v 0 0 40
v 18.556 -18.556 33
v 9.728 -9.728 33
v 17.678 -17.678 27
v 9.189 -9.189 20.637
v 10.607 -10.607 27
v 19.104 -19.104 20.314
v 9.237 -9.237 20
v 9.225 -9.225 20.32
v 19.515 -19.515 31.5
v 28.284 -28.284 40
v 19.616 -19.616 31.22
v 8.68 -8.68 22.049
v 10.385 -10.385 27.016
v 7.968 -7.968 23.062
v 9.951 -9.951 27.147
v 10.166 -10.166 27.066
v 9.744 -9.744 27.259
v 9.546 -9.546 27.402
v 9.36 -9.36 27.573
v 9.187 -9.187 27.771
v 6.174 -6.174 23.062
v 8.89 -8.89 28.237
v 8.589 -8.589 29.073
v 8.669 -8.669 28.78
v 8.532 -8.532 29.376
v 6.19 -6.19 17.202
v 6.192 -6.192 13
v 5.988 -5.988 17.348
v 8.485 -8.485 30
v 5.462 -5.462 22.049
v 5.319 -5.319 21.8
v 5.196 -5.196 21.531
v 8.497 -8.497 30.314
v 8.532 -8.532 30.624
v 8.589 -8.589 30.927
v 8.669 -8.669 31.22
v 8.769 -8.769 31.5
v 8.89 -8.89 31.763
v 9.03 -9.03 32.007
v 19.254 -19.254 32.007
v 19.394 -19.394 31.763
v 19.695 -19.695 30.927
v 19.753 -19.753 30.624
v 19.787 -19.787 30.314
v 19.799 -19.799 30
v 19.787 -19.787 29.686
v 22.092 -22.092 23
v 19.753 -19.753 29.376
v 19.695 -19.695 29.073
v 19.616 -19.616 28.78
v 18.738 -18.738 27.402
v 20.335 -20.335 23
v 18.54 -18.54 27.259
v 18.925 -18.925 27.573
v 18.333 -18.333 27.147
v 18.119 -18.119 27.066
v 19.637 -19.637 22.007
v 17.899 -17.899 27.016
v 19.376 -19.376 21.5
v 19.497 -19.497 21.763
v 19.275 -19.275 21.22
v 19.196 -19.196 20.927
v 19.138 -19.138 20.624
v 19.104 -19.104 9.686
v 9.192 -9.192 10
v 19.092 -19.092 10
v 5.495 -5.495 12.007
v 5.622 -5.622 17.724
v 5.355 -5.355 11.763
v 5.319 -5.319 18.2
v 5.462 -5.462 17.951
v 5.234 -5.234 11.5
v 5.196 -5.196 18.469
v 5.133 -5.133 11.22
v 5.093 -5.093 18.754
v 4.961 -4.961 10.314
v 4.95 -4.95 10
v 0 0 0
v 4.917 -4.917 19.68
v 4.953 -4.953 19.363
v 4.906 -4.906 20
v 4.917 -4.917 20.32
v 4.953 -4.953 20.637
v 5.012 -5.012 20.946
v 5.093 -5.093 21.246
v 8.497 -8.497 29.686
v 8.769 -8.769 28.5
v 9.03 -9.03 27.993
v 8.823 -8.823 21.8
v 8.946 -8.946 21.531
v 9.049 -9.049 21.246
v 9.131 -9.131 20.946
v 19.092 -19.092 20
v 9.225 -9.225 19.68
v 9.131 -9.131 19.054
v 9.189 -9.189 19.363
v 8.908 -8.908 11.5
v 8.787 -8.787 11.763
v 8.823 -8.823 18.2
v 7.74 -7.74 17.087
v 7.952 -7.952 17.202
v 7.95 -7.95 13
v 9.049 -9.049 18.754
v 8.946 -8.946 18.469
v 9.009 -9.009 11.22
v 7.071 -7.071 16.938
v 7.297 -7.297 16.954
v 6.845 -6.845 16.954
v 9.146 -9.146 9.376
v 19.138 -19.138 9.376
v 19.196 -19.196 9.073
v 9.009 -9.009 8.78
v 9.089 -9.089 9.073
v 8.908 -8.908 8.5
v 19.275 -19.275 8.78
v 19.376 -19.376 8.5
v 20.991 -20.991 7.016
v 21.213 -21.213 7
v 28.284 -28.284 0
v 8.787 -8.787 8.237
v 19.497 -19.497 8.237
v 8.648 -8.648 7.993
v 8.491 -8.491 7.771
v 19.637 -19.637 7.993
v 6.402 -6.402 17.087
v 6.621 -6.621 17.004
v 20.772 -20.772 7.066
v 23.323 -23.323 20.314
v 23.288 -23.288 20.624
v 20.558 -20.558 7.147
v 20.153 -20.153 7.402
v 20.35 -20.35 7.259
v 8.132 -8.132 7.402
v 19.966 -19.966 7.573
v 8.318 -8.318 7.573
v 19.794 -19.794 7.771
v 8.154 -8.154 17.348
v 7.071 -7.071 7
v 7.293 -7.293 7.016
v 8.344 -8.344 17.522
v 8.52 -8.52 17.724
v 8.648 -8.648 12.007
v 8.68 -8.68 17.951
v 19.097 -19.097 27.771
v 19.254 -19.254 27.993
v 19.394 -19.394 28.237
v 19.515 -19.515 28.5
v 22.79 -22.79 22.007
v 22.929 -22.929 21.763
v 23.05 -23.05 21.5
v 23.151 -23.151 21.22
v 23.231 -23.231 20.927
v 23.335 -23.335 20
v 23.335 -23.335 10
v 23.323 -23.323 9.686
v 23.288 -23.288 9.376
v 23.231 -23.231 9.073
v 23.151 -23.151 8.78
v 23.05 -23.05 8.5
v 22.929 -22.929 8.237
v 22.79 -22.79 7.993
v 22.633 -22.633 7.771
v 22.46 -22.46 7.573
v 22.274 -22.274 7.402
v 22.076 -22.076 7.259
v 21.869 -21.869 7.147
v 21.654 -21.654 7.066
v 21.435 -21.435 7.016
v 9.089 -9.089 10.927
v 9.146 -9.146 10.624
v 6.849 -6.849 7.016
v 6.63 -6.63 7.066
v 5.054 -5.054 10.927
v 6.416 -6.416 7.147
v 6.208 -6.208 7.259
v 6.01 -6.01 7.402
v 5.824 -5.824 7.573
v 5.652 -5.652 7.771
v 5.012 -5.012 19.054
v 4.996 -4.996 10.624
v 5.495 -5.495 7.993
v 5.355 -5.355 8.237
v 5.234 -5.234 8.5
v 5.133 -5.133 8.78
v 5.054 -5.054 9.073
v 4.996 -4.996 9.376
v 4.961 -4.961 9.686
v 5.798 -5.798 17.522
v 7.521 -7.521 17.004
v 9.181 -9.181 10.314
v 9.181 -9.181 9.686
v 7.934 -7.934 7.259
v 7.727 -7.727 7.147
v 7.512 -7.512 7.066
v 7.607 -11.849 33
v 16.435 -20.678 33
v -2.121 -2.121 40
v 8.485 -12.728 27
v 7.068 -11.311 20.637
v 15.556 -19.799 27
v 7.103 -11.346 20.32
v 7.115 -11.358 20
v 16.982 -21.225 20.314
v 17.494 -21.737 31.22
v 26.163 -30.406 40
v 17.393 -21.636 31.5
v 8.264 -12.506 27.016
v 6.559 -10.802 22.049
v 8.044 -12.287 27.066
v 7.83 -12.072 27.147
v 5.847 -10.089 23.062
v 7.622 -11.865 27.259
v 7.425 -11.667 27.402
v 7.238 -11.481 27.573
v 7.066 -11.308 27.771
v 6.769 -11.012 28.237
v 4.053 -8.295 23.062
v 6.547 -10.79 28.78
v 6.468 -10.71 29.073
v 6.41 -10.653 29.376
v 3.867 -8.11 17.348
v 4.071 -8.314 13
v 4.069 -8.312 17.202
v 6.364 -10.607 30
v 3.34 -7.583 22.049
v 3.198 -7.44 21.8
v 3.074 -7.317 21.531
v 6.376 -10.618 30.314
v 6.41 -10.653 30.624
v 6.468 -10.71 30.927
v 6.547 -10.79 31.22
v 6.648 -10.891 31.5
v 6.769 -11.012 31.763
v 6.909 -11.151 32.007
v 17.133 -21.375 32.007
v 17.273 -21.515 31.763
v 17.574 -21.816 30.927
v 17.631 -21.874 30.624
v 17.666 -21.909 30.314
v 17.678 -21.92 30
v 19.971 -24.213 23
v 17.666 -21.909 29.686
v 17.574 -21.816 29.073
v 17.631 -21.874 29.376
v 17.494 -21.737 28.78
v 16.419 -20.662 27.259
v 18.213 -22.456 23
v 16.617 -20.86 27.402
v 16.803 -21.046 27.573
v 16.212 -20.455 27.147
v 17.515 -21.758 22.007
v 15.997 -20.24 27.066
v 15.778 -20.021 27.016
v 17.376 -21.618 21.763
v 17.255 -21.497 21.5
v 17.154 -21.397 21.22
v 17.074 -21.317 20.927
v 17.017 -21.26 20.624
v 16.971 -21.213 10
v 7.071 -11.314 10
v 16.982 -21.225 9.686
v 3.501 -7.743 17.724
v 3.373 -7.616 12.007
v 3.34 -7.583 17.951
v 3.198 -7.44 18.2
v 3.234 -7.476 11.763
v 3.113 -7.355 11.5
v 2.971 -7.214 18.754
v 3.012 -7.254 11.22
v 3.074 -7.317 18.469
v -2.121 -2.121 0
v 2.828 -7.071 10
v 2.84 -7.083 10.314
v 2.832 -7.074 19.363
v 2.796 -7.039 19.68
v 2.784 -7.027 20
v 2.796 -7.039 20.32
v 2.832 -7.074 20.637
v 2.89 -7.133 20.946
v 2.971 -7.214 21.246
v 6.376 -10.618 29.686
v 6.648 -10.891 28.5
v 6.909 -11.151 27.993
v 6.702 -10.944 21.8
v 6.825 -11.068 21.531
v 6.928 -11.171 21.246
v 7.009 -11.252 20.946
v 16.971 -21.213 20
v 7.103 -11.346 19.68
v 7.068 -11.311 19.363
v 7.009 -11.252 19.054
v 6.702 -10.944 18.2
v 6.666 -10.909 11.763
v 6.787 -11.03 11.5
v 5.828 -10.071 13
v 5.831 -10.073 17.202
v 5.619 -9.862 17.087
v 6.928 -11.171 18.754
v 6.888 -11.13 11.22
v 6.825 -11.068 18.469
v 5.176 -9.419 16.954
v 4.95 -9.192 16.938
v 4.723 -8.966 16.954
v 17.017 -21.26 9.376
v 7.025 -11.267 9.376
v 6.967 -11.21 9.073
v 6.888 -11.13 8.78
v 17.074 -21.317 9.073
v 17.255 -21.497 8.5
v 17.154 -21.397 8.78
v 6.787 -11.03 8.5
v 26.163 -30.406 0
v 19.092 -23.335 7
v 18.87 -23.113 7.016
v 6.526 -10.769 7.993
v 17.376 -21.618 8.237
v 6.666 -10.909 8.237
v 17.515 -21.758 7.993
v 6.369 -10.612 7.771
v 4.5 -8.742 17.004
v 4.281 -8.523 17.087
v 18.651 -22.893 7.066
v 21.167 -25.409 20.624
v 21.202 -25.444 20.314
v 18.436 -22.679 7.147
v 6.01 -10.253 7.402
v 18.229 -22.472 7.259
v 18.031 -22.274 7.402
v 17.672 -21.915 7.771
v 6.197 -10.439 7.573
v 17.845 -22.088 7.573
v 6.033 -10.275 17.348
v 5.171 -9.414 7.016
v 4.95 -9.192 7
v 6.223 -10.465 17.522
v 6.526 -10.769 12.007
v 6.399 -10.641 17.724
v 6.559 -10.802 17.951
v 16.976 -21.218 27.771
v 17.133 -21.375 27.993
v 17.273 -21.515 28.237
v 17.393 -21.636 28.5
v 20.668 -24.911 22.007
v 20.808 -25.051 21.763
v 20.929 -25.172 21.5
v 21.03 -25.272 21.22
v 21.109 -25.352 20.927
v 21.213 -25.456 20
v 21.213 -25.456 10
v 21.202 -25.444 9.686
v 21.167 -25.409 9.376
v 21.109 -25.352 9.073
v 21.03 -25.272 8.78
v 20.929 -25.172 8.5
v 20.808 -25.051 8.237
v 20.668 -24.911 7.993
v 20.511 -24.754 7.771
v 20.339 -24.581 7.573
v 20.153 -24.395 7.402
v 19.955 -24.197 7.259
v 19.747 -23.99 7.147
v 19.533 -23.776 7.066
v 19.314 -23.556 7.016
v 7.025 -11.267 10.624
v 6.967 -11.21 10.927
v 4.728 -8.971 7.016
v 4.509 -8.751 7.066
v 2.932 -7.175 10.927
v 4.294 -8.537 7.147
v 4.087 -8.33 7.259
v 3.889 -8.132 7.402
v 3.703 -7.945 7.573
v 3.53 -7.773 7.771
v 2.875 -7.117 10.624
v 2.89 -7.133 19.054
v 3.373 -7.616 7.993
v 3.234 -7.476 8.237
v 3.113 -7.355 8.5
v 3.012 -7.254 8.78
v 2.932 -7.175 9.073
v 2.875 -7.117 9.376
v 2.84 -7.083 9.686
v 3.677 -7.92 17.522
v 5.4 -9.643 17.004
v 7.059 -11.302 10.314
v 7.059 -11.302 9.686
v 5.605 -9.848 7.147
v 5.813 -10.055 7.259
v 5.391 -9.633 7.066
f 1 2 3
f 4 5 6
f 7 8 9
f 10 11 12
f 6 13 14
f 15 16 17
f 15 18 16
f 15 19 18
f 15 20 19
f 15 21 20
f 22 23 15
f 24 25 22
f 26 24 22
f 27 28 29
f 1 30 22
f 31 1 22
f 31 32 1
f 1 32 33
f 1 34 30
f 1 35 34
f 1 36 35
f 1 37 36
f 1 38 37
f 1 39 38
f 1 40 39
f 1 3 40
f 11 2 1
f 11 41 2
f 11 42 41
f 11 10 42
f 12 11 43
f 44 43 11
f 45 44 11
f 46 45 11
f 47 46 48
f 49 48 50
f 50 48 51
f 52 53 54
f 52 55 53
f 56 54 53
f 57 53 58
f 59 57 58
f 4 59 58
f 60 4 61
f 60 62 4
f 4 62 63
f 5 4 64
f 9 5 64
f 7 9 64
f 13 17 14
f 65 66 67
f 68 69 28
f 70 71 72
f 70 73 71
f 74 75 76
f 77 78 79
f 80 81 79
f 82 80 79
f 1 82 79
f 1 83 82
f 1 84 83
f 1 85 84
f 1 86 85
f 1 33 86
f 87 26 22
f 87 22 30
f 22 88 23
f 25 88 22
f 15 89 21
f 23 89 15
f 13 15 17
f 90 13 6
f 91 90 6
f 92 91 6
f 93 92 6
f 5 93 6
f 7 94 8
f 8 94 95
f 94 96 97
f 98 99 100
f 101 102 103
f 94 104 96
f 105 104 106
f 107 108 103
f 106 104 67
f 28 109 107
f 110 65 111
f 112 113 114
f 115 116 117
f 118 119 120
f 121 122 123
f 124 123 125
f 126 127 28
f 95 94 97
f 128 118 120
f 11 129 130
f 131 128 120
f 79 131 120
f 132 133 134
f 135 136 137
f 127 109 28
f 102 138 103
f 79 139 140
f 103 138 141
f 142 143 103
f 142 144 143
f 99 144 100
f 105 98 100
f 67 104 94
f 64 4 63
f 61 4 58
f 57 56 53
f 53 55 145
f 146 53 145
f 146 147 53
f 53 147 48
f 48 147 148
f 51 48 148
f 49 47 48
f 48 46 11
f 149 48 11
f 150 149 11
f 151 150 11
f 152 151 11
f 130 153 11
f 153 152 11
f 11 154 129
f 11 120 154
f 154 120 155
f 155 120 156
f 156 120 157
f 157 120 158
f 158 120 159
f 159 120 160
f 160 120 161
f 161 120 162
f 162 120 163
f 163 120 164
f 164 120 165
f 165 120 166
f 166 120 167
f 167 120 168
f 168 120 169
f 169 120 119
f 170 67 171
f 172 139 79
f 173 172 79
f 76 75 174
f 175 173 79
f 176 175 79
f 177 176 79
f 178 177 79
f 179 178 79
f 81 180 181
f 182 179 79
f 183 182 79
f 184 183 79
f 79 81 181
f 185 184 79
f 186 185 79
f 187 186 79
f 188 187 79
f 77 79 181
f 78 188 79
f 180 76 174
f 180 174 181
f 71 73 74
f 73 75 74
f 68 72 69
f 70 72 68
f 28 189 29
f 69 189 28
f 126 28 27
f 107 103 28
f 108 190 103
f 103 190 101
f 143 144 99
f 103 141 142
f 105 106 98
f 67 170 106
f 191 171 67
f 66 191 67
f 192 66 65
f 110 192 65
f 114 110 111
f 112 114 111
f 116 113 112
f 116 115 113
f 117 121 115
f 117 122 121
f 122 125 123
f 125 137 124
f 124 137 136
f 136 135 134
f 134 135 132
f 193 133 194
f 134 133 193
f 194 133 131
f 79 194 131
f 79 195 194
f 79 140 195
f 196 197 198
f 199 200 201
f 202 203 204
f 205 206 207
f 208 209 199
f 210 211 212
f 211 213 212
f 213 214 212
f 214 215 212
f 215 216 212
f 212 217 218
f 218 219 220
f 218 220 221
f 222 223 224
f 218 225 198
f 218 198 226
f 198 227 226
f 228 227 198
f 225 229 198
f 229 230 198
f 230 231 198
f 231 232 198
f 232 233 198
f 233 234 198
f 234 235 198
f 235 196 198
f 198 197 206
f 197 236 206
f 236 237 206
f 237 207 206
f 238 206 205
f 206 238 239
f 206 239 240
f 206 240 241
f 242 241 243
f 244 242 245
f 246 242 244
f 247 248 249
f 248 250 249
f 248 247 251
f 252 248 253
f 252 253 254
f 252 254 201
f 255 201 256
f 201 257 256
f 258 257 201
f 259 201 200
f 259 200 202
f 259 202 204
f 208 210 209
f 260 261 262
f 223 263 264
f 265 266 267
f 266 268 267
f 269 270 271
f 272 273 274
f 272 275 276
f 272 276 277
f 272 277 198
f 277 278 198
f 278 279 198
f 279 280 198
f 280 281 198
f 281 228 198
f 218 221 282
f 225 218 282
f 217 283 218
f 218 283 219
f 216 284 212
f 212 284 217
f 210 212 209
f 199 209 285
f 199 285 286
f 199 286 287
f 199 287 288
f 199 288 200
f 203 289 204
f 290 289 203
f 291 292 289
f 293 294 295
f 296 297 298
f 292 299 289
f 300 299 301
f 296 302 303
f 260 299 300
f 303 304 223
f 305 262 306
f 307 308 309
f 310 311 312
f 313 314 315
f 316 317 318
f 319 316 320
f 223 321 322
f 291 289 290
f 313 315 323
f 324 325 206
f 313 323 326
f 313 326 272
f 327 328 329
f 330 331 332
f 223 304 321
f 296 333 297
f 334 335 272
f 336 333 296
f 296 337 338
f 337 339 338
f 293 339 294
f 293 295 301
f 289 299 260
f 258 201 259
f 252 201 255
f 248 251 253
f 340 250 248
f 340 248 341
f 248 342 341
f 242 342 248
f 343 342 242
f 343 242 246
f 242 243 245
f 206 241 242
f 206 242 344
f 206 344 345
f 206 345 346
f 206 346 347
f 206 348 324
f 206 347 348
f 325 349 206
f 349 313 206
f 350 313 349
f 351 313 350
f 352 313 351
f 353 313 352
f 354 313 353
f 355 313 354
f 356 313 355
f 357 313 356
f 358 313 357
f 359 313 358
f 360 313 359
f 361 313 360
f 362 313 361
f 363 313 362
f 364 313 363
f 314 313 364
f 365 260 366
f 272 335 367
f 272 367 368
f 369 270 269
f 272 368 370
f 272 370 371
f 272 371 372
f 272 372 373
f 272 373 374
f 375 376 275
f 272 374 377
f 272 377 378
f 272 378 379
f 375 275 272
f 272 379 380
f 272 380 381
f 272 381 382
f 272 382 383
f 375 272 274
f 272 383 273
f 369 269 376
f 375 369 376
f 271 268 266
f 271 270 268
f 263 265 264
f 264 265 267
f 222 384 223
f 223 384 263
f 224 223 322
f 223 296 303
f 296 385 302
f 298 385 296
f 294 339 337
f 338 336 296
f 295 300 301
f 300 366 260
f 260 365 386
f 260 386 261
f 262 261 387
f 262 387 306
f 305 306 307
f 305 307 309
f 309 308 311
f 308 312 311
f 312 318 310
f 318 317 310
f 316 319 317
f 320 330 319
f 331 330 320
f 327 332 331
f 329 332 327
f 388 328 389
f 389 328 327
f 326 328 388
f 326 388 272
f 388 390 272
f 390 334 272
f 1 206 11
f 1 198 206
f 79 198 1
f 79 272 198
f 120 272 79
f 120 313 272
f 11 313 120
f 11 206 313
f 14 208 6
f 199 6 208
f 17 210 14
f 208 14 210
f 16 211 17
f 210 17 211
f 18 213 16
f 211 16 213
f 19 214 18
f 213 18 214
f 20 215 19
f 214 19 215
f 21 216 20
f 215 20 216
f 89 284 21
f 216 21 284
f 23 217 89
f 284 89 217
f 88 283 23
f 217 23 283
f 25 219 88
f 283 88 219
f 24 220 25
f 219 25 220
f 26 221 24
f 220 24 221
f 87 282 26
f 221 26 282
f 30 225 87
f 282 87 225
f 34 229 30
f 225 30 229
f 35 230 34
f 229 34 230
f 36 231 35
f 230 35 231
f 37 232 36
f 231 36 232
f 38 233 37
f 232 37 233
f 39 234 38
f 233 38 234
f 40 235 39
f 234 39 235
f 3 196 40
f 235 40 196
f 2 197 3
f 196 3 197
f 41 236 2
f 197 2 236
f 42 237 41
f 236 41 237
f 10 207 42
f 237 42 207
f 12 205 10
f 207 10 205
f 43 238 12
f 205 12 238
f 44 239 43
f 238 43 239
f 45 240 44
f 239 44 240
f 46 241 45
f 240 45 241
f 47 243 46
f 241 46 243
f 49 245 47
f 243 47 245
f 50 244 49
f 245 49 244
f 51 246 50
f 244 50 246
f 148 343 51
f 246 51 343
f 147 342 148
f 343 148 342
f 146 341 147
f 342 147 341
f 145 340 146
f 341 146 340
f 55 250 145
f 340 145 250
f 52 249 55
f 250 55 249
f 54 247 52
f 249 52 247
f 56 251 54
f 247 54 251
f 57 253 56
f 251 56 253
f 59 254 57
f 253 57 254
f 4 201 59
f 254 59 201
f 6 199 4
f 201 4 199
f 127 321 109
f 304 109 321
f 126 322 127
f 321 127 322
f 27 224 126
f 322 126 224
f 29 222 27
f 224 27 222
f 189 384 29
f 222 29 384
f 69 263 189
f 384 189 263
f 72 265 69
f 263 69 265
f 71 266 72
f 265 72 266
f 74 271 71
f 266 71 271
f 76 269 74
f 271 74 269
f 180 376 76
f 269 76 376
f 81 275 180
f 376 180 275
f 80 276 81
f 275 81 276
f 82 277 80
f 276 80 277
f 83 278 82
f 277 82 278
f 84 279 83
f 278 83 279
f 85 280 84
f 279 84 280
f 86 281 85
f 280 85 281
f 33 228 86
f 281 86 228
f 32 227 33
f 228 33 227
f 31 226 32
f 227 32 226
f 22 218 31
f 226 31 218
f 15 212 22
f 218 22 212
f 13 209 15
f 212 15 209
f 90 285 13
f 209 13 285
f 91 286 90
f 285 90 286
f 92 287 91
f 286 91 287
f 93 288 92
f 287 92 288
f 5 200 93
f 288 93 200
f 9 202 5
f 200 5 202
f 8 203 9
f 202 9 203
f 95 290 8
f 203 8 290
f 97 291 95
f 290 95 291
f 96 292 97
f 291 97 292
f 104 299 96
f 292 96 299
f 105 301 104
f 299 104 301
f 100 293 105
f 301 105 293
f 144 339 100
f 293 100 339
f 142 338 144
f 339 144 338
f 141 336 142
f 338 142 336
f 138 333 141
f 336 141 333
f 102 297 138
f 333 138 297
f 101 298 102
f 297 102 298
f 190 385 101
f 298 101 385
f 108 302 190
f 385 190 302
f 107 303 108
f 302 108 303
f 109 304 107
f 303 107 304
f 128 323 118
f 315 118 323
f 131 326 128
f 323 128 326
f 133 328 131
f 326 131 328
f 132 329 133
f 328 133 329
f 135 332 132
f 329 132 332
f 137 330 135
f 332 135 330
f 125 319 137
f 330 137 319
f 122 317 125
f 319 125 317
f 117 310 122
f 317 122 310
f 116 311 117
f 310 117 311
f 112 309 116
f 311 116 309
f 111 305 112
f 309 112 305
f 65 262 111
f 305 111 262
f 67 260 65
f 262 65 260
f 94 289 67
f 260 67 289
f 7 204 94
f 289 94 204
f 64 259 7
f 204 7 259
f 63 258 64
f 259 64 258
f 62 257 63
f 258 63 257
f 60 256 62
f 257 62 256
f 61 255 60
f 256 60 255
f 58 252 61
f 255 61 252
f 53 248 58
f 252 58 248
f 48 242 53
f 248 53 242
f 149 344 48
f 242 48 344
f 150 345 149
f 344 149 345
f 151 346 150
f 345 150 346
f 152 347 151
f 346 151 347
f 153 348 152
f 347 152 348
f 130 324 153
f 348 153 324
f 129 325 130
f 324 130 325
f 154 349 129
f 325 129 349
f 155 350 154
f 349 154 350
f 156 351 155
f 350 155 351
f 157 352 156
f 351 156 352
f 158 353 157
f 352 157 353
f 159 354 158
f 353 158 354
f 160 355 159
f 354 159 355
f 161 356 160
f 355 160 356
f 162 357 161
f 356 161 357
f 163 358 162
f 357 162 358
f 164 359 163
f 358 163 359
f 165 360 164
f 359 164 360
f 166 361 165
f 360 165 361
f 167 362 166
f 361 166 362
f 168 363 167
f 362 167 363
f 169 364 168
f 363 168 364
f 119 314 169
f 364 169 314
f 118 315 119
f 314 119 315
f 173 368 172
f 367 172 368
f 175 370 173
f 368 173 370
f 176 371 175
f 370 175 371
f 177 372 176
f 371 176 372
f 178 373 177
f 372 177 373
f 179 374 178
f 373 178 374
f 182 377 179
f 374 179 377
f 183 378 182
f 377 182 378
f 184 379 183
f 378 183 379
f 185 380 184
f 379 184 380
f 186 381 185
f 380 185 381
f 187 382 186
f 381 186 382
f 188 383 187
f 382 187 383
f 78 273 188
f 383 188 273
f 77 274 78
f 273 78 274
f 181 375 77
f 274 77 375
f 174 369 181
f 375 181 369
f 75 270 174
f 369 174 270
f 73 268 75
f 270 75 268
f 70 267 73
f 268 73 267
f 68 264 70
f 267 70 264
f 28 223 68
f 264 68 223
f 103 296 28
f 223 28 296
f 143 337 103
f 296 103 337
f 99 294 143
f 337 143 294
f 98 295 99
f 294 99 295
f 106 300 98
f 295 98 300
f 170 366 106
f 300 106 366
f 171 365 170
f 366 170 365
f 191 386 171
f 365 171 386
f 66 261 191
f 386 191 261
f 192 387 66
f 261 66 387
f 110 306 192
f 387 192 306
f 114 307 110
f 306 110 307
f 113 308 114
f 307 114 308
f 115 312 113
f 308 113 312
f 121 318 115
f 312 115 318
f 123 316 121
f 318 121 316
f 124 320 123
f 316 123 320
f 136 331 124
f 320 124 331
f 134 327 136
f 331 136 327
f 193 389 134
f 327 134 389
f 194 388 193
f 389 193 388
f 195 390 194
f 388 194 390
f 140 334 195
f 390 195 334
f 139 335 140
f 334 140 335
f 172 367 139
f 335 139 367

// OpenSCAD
// file: ../utils/core/clip.scad
//
// NopSCADlib Copyright Chris Palmer 2018
// nop.head@gmail.com
// hydraraptor.blogspot.com
//
// This file is part of NopSCADlib.
//
// NopSCADlib is free software: you can redistribute it and/or modify it under the terms of the
// GNU General Public License as published by the Free Software Foundation, either version 3 of
// the License, or (at your option) any later version.
//
// NopSCADlib is distributed in the hope that it will be useful, but WITHOUT ANY WARRANTY;
// without even the implied warranty of MERCHANTABILITY or FITNESS FOR A PARTICULAR PURPOSE.
// See the GNU General Public License for more details.
//
// You should have received a copy of the GNU General Public License along with NopSCADlib.
// If not, see <https://www.gnu.org/licenses/>.
//

//
//! Construct arbirarily large box to partition 3D space and clip objects, useful for creating cross sections to see the inside when debugging.
//!
//! Original version by Doug Moen on the OpenSCAD forum
//
//
module box(xmin, ymin, zmin, xmax, ymax, zmax) //! Construct a box given its bounds
    polyhedron(
        [[xmin, ymin, zmin],  // 0
         [xmin, ymin, zmax],  // 1
         [xmin, ymax, zmin],  // 2
         [xmin, ymax, zmax],  // 3
         [xmax, ymin, zmin],  // 4
         [xmax, ymin, zmax],  // 5
         [xmax, ymax, zmin],  // 6
         [xmax, ymax, zmax]], // 7
        [[7,5,1,3],  // top
         [2,0,4,6],  // bottom
         [5,4,0,1],  // front
         [3,2,6,7],  // back
         [5,7,6,4],  // right
         [0,2,3,1]]  // left
    );

module clip(xmin = -inf, ymin = -inf, zmin = -inf, xmax = inf, ymax = inf, zmax = inf) //! Clip child to specified boundaries
    render() intersection() {
        children();

        box(xmin, ymin, zmin, xmax, ymax, zmax);
    }
// file: ../utils/core/rounded_rectangle.scad
//
// NopSCADlib Copyright Chris Palmer 2018
// nop.head@gmail.com
// hydraraptor.blogspot.com
//
// This file is part of NopSCADlib.
//
// NopSCADlib is free software: you can redistribute it and/or modify it under the terms of the
// GNU General Public License as published by the Free Software Foundation, either version 3 of
// the License, or (at your option) any later version.
//
// NopSCADlib is distributed in the hope that it will be useful, but WITHOUT ANY WARRANTY;
// without even the implied warranty of MERCHANTABILITY or FITNESS FOR A PARTICULAR PURPOSE.
// See the GNU General Public License for more details.
//
// You should have received a copy of the GNU General Public License along with NopSCADlib.
// If not, see <https://www.gnu.org/licenses/>.
//

//
//! Rectangle with rounded corners.
//
module rounded_square(size, r, center = true) //! Like ```square()``` but with with rounded corners
{
    $fn = r2sides4n(r);
    offset(r) offset(-r) square(size, center = center);
}

module rounded_rectangle(size, r, center = true, xy_center = true) //! Like ```cube()``` but corners rounded in XY plane and separate centre options for xy and z.
{
    linear_extrude(height = size[2], center = center)
        rounded_square([size[0], size[1]], r, xy_center);
}
// file: ../utils/core/teardrops.scad
//
// NopSCADlib Copyright Chris Palmer 2018
// nop.head@gmail.com
// hydraraptor.blogspot.com
//
// This file is part of NopSCADlib.
//
// NopSCADlib is free software: you can redistribute it and/or modify it under the terms of the
// GNU General Public License as published by the Free Software Foundation, either version 3 of
// the License, or (at your option) any later version.
//
// NopSCADlib is distributed in the hope that it will be useful, but WITHOUT ANY WARRANTY;
// without even the implied warranty of MERCHANTABILITY or FITNESS FOR A PARTICULAR PURPOSE.
// See the GNU General Public License for more details.
//
// You should have received a copy of the GNU General Public License along with NopSCADlib.
// If not, see <https://www.gnu.org/licenses/>.
//

//
//! For making horizontal holes that don't need support material.
//! Small holes can get away without it, but they print better with truncated teardrops.
//
module teardrop(h, r, center = true, truncate = true) //! For making horizontal holes that don't need support material, set ```truncate = false``` to make traditional RepRap teardrops that don't even need bridging
    render(convexity = 5)
        extrude_if(h, center)
           hull() {
                circle4n(r);

                if(truncate)
                    translate([0, r / 2])
                        square([2 * r * (sqrt(2) - 1), r], center = true);
                else
                    polygon([[0, 0], [eps, 0], [0, r * sqrt(2)]]);
            }

module teardrop_plus(h, r, center = true, truncate = true) //! Slightly bigger teardrop to allow for the 3D printing staircase effect
    teardrop(h, r + layer_height / 4, center, truncate);

module tearslot(h, r, w, center = true) //! A horizontal slot that doesn't need support material
    extrude_if(h, center)
        hull() {
            translate([-w/2,0,0]) teardrop(r = r, h = 0);
            translate([ w/2,0,0]) teardrop(r = r, h = 0);
        }

module vertical_tearslot(h, r, l, center = true) //! A vertical slot that doesn't need support material
    extrude_if(h, center)
        hull() {
            translate([0,  l / 2]) teardrop(0, r, true);
            translate([0, -l / 2])
                circle4n(r);
        }
// file: ../utils/core/polyholes.scad
//
// NopSCADlib Copyright Chris Palmer 2018
// nop.head@gmail.com
// hydraraptor.blogspot.com
//
// This file is part of NopSCADlib.
//
// NopSCADlib is free software: you can redistribute it and/or modify it under the terms of the
// GNU General Public License as published by the Free Software Foundation, either version 3 of
// the License, or (at your option) any later version.
//
// NopSCADlib is distributed in the hope that it will be useful, but WITHOUT ANY WARRANTY;
// without even the implied warranty of MERCHANTABILITY or FITNESS FOR A PARTICULAR PURPOSE.
// See the GNU General Public License for more details.
//
// You should have received a copy of the GNU General Public License along with NopSCADlib.
// If not, see <https://www.gnu.org/licenses/>.
//

//
//! A method of making 3D printed holes come out the right size regardless of the printer, providing
//! it gets the linear dimensions right. See <https://hydraraptor.blogspot.com/2011/02/polyholes.html>
//!
//! The module provides `poly_circle()`, `poly_cylinder()` and `poly_ring()` that is useful for making printed washers and pillars.
//
function sides(r) = max(round(4 * r), 3); //! Optimium number of sides for specified radius
function corrected_radius(r, n = 0)   = r / cos(180 / (n ? n : sides(r))); //! Adjusted radius to make flats lie on the circle
function corrected_diameter(d, n = 0) = d / cos(180 / (n ? n : sides(d / 2))); //! Adjusted diameter to make flats lie on the circle

module poly_circle(r, sides = 0) { //! Make a circle adjusted to print the correct size
    n = sides ? sides : sides(r);
    circle(r = corrected_radius(r,n), $fn = n);
}

module poly_cylinder(r, h, center = false, sides = 0) //! Make a cylinder adjusted to print the correct size
    extrude_if(h, center)
        poly_circle(r, sides);

module poly_ring(or, ir) { //! Make a 2D ring adjusted to have the correct internal radius
    cir = corrected_radius(ir);
    filaments = floor((or - cir) / extrusion_width);
    if(filaments > 3)
        difference() {
            circle(or);

            poly_circle(ir);
        }
    else
        if(filaments >= 2)
            difference() {
                offset(or - cir)
                    poly_circle(ir);

                poly_circle(ir);
            }
            else
                difference() {
                    poly_circle(or);

                    offset(-squeezed_wall)
                        poly_circle(or);
                }
}

module drill(r, h = 100) //! Make a cylinder for drilling holes suitable for CNC routing, set h = 0 for circle
    extrude_if(h)
        circle(r = corrected_radius(r, r2sides(r)));
//
// Horizontal slot
//
module slot(r, l, h = 100) //! Make a horizontal slot suitable for CNC routing, set h = 0 for 2D version
    extrude_if(h)
        hull() {
            translate([l / 2,0])
                drill(r, 0);

            translate([-l / 2,0])
                drill(r, 0);
        }
// file: ../utils/core/bom.scad
//
// NopSCADlib Copyright Chris Palmer 2018
// nop.head@gmail.com
// hydraraptor.blogspot.com
//
// This file is part of NopSCADlib.
//
// NopSCADlib is free software: you can redistribute it and/or modify it under the terms of the
// GNU General Public License as published by the Free Software Foundation, either version 3 of
// the License, or (at your option) any later version.
//
// NopSCADlib is distributed in the hope that it will be useful, but WITHOUT ANY WARRANTY;
// without even the implied warranty of MERCHANTABILITY or FITNESS FOR A PARTICULAR PURPOSE.
// See the GNU General Public License for more details.
//
// You should have received a copy of the GNU General Public License along with NopSCADlib.
// If not, see <https://www.gnu.org/licenses/>.
//

//
//! Bill Of Materials generation via echo and the ```bom.py``` script. Also handles exploded assembly views and posing. Assembly instructions can precede the module
//! definition that makes the assembly.
//!
//! The example below shows how to define a vitamin and incorporate it into an assembly with sub-assemblies and make an exploded view. The resulting flat BOM is shown but
//! heirachical BOMs are also generated for real projects.
//
function bom_mode(n = 1) = $_bom >= n && (is_undef($on_bom) || $on_bom);  //! Current BOM mode, 0 = none, 1 = printed and routed parts and assemblies, 2 includes vitamins as well
function exploded() = is_undef($exploded_parent) ? $exploded : 0;   //! Returns the value of ```$exploded``` if it is defined, else ```0```
function show_supports() = !$preview || exploded();                 //! True if printed support material should be shown

module no_explode() let($exploded_parent = true) children();        //! Prevent children being exploded
module no_pose() let($posed = true) children();                     //! Force children not to be posed even if parent is

module explode(d, explode_children = false, offset = [0,0,0]) {     //! Explode children by specified Z distance or vector ```d```, option to explode grand children
    v = is_list(d) ? d : [0, 0, d];
    o = is_list(offset) ? offset : [0, 0, offset];
    if($exploded && is_undef($exploded_parent)) {
        translate(o)                                                // Draw the line first in case the child is transparent
            hull() {
                sphere(0.2);

                translate(v * $exploded)
                    sphere(0.2);
            }

        translate(v * $exploded)
            let($exploded_parent = explode_children ? undef : true)
                children();
    }
    else
        children();
}

module pose(a = [55, 0, 25], t = [0, 0, 0], exploded = undef)       //! Pose an STL or assembly for rendering to png by specifying rotation ```a``` and translation ```t```, ```exploded = true for``` just the exploded view or ```false``` for unexploded only.
    if(is_undef($pose) || !is_undef($posed) || (!is_undef(exploded) && exploded != !!exploded()))
        children();
    else
        let($posed = true) // only pose the top level
            rotate([55, 0, 25])
                rotate([-a.x, 0, 0])
                    rotate([0, -a.y, 0])
                        rotate([0, 0, -a.z])
                            translate(-t)
                                children();


module assembly(name) {                 //! Name an assembly that will appear on the BOM, there needs to a module named ```<name>_assembly``` to make it
    if(bom_mode())
        echo(str("~", name, "_assembly{"));

    no_pose()
        if(is_undef($child_assembly))
            let($child_assembly = true)
                children();
        else
            no_explode()
                children();

    if(bom_mode())
        echo(str("~}", name, "_assembly"));
}

module stl(name) {                      //! Name an stl that will appear on the BOM, there needs to a module named ```<name>_stl``` to make it
    if(bom_mode())
        echo(str("~", name, ".stl"));
}

module dxf(name) {                      //! Name a dxf that will appear on the BOM, there needs to a module named ```<name>_dxf``` to make it
    if(bom_mode())
        echo(str("~", name, ".dxf"));
}

function value_string(value) = is_string(value) ? str("\"", value, "\"") : str(value); //! Convert ```value``` to a string or quote it if it is already a string

function arg(value, default, name = "") =   //! Create string for arg if not default, helper for ```vitamin()```
    value == default ? ""
                     : name ? str(", ", name, " = ", value_string(value))
                            : str(", ", value_string(value));

module vitamin(description) {                //! Describe a vitamin for the BOM entry and precede it with a module call that creates it, eg. "wigit(42): Type 42 widget"
    if(bom_mode(2))
        echo(str("~", description, !is_undef($hidden) ? " - not shown" : ""));
}

module not_on_bom(on = false)               //! Specify the following child parts are not on the BOM, for example when they are on a PCB that comes assembled
    let($on_bom = on)
        children();

module hidden()                             //! Make item invisible, except on the BOM
    scale(1 / sqr(1024))
        let($hidden = true)
            children();
// file: ../utils/core/sphere.scad
//
// NopSCADlib Copyright Chris Palmer 2018
// nop.head@gmail.com
// hydraraptor.blogspot.com
//
// This file is part of NopSCADlib.
//
// NopSCADlib is free software: you can redistribute it and/or modify it under the terms of the
// GNU General Public License as published by the Free Software Foundation, either version 3 of
// the License, or (at your option) any later version.
//
// NopSCADlib is distributed in the hope that it will be useful, but WITHOUT ANY WARRANTY;
// without even the implied warranty of MERCHANTABILITY or FITNESS FOR A PARTICULAR PURPOSE.
// See the GNU General Public License for more details.
//
// You should have received a copy of the GNU General Public License along with NopSCADlib.
// If not, see <https://www.gnu.org/licenses/>.
//

//! Redefines `sphere()` to always have a vertex on all six half axes I.e. vertices at the poles and the equator and `$fn` a multiple of four.
//! This ensures `hull` and `minkowski` results have the correct dimensions when spheres are placed at the corners.

module sphere(r = 1, d = undef) {                   //! Override ```sphere``` so that has vertices on all three axes. Has the advantage of giving correct dimensions when hulled
    R = is_undef(d) ? r : d / 2;
    rotate_extrude($fn = r2sides4n(R))
        rotate(-90)
            semi_circle(R);
}
// file: ../utils/core/global.scad
//
// NopSCADlib Copyright Chris Palmer 2018
// nop.head@gmail.com
// hydraraptor.blogspot.com
//
// This file is part of NopSCADlib.
//
// NopSCADlib is free software: you can redistribute it and/or modify it under the terms of the
// GNU General Public License as published by the Free Software Foundation, either version 3 of
// the License, or (at your option) any later version.
//
// NopSCADlib is distributed in the hope that it will be useful, but WITHOUT ANY WARRANTY;
// without even the implied warranty of MERCHANTABILITY or FITNESS FOR A PARTICULAR PURPOSE.
// See the GNU General Public License for more details.
//
// You should have received a copy of the GNU General Public License along with NopSCADlib.
// If not, see <https://www.gnu.org/licenses/>.
//

//
//! Global constants, functions and modules. This file is used directly or indirectly in every scad file.
//
include <../../global_defs.scad>

function sqr(x) = x * x;                                                            //! Returns the square of ```x```
function inch(x) = x * 25.4;                                                        //! Inch to mm conversion
function echoit(x) = echo(x) x;                                                     //! Echo expression and return it, useful for debugging
function in(list, x) = !!len([for(v = list) if(v == x) true]);                      //! Returns true if ```x``` is an element in the ```list```
function Len(x) = is_list(x) ? len(x) : 0;                                          //! Returns the length of a list or 0 if ```x``` is not a list
function r2sides(r) = $fn ? $fn : ceil(max(min(360/ $fa, r * 2 * PI / $fs), 5));    //! Replicates the OpenSCAD logic to calculate the number of sides from the radius
function r2sides4n(r) = floor((r2sides(r) + 3) / 4) * 4;                            //! Round up the number of sides to a multiple of 4 to ensure points land on all axes

module translate_z(z) translate([0, 0, z]) children();                              //! Shortcut for Z only translations
module vflip() rotate([180, 0, 0]) children();                                      //! Invert children by doing a 180 flip around the X axis
module ellipse(xr, yr) scale([1, yr / xr]) circle4n(xr);                            //! Draw an ellipse

module extrude_if(h, center = true)                 //! Extrudes 2D object to 3D when ```h``` is nonzero, otherwise leaves it 2D
    if(h)
        linear_extrude(height = h, center = center) // 3D
            children();
    else
        children();                                 // 2D

module circle4n(r, d = undef) {                     //! Circle with multiple of 4 vertices
    R = is_undef(d) ? r : d / 2;
    circle(R, $fn = r2sides4n(R));
}

module semi_circle(r, d = undef)                    //! A semi circle in the positive Y domain
    intersection() {
        R = is_undef(d) ? r : d / 2;
        circle4n(R);

        sq = R + 1;
        translate([-sq, 0])
            square([2 * sq, sq]);
    }

include <sphere.scad>
include <bom.scad>
include <polyholes.scad>
include <teardrops.scad>
include <rounded_rectangle.scad>
include <clip.scad>
// file: ../global_defs.scad
//
// NopSCADlib Copyright Chris Palmer 2018
// nop.head@gmail.com
// hydraraptor.blogspot.com
//
// This file is part of NopSCADlib.
//
// NopSCADlib is free software: you can redistribute it and/or modify it under the terms of the
// GNU General Public License as published by the Free Software Foundation, either version 3 of
// the License, or (at your option) any later version.
//
// NopSCADlib is distributed in the hope that it will be useful, but WITHOUT ANY WARRANTY;
// without even the implied warranty of MERCHANTABILITY or FITNESS FOR A PARTICULAR PURPOSE.
// See the GNU General Public License for more details.
//
// You should have received a copy of the GNU General Public License along with NopSCADlib.
// If not, see <https://www.gnu.org/licenses/>.
//

//
// This file included directly or indirectly in every scad file.
//
// This scheme allows the following:
//  bom defaults to 0
//  Setting $bom on the command line or in the main file before including lib.scad overrides it everywhere.
//  Setting $bom after including lib overrides bom in the libs but not in the local file.
//  Setting $_bom in the local file overrides it in the local file but not in the libs.
//
//function is_undef(x) = x == undef;

$_bom           = is_undef($bom)             ? 0      : $bom;             // 0 no bom, 1 assemblies and stls, 2 vitamins as well
$exploded       = is_undef($explode)         ? 0      : $explode;         // 1 for exploded view
layer_height    = is_undef($layer_height)    ? 0.25   : $layer_height;    // layer heigth when printing
extrusion_width = is_undef($extrusion_width) ? 0.5    : $extrusion_width; // filament width when printing
nozzle          = is_undef($nozzle)          ? 0.45   : $nozzle;          // 3D printer nozzle
cnc_bit_r       = is_undef($cnc_bit_r)       ? 1.2    : $cnc_bit_r;       // miniumum tool radius when milling 2D objects
pp1_colour      = is_undef($pp1_colour)      ? "lime" : $pp1_colour;      // printed part colour 1
pp2_colour      = is_undef($pp2_colour)      ? "red"  : $pp2_colour;      // printed part colour 2
pp3_colour      = is_undef($pp3_colour)      ? "blue" : $pp3_colour;      // printed part colour 3
pp4_colour      = is_undef($pp4_colour)      ? "darkorange" : $pp4_colour;// printed part colour 4
show_rays       = is_undef($show_rays)       ? false  : $show_rays;       // show camera sight lines and light direction

// Minimum wall is about two filaments wide but we extrude it closer to get better bonding
squeezed_wall = $preview ? 2 * extrusion_width - layer_height * (1 - PI / 4)
                         : extrusion_width - layer_height / 2 + nozzle / 2 + extrusion_width / 2;

inf = 1e10;      // very big
eps = 1/128;     // small fudge factor to stop CSG barfing on coincident faces.
$fa = 6;
$fs = extrusion_width / 2;

function round_to_layer(z) = ceil(z / layer_height) * layer_height;
// Some additional named colors
grey20                          = [0.2, 0.2, 0.2];
grey30                          = [0.3, 0.3, 0.3];
grey40                          = [0.4, 0.4, 0.4];
grey50                          = [0.5, 0.5, 0.5];
grey60                          = [0.6, 0.6, 0.6];
grey70                          = [0.7, 0.7, 0.7];
grey80                          = [0.8, 0.8, 0.8];
grey90                          = [0.9, 0.9, 0.9];
brass                           = "gold";

/*
 * Enums
 */
//
// Screws
//
hs_cap    = 0;
hs_pan    = 1;
hs_cs     = 2;     // counter sunk
hs_hex    = 3;
hs_grub   = 4;     // pulley set screw
hs_cs_cap = 5;
hs_dome   = 6;
//
// Hot end descriptions
//
jhead   = 1;
e3d     = 2;
//
// Face enumeration
//
f_bottom = 0;
f_top    = 1;
f_left   = 2;
f_right  = 3;
f_front  = 4;
f_back   = 5;
// file: ../core.scad
//
// NopSCADlib Copyright Chris Palmer 2018
// nop.head@gmail.com
// hydraraptor.blogspot.com
//
// This file is part of NopSCADlib.
//
// NopSCADlib is free software: you can redistribute it and/or modify it under the terms of the
// GNU General Public License as published by the Free Software Foundation, either version 3 of
// the License, or (at your option) any later version.
//
// NopSCADlib is distributed in the hope that it will be useful, but WITHOUT ANY WARRANTY;
// without even the implied warranty of MERCHANTABILITY or FITNESS FOR A PARTICULAR PURPOSE.
// See the GNU General Public License for more details.
//
// You should have received a copy of the GNU General Public License along with NopSCADlib.
// If not, see <https://www.gnu.org/licenses/>.
//

//
// Include this file to use the library
//
include <global_defs.scad>
//
// Global functions and modules
//
use <utils/core/global.scad>
// main file
//
// NopSCADlib Copyright Chris Palmer 2018
// nop.head@gmail.com
// hydraraptor.blogspot.com
//
// This file is part of NopSCADlib.
//
// NopSCADlib is free software: you can redistribute it and/or modify it under the terms of the
// GNU General Public License as published by the Free Software Foundation, either version 3 of
// the License, or (at your option) any later version.
//
// NopSCADlib is distributed in the hope that it will be useful, but WITHOUT ANY WARRANTY;
// without even the implied warranty of MERCHANTABILITY or FITNESS FOR A PARTICULAR PURPOSE.
// See the GNU General Public License for more details.
//
// You should have received a copy of the GNU General Public License along with NopSCADlib.
// If not, see <https://www.gnu.org/licenses/>.
//

include <../core.scad>

module teardrops() {
    color(pp1_colour)
        rotate([90, 0, -45])
            linear_extrude(height = 3)
                difference() {
                    square(40);

                    translate([10, 10])
                        teardrop(h = 0, r = 3);

                    translate([10, 20])
                        teardrop_plus(h = 0, r = 3);

                    translate([20, 30])
                        tearslot(h = 0, r = 3, w = 10);

                    translate([30, 15])
                         vertical_tearslot(h = 0, r =3, l = 10);
                }
}

teardrops();
